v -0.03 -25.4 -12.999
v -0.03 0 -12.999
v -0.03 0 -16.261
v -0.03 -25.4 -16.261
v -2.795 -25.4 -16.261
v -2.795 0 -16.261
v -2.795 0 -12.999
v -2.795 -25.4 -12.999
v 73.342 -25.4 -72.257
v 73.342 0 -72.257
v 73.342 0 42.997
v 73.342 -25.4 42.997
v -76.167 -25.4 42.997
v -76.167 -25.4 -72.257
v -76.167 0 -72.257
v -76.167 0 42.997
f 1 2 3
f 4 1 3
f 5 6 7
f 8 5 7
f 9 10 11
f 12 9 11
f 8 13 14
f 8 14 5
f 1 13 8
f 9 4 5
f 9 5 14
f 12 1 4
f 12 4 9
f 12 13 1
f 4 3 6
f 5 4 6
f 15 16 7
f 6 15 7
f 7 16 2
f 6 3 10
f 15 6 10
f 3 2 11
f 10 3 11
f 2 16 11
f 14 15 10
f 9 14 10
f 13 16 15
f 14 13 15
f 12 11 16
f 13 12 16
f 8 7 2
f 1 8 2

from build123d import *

# Parameters (mm, degrees)
F1_DEPTH = 25.4
F2_DEPTH = 25.4
F3_DEPTH = 25.4
F4_DEPTH = 25.4
F5_DEPTH = 25.4
F6_DEPTH = 25.4
F7_DEPTH = 25.4
F8_DEPTH = 25.4


with BuildPart() as f1:
    # F0 (on Front) → F1 (new body)
    with BuildSketch(Plane.XZ):
        Polygon((-66.7927114991, 33.1945642829), (-64.1307688012, 33.1945642829), (-76.1674283869, 42.9970185669), (-76.1674283869, -72.256666741), (-64.1307688012, -62.4542124569), (-66.7927114991, -62.4542124569), align=None)
        Polygon((-64.1307688012, 33.1945642829), (61.9984398217, 33.1945642829), (73.3423603098, 42.9970185669), (-76.1674283869, 42.9970185669), align=None)
        Polygon((73.3423603098, 42.9970185669), (61.9984398217, 33.1945642829), (63.9676434221, 33.1945642829), (63.9676434221, -62.4542124569), (61.3057007242, -62.4542124569), (73.3423603098, -72.256666741), align=None)
        Polygon((73.3423603098, -72.256666741), (61.3057007242, -62.4542124569), (-64.1307688012, -62.4542124569), (-76.1674283869, -72.256666741), align=None)
    extrude(amount=F1_DEPTH)

    # F0 (on Front) → F2 (join)
    with BuildSketch(Plane.XZ):
        Polygon((-56.703176233, 23.9121932536), (-52.7327314332, 23.9121932536), (-64.1307688012, 33.1945642829), (-66.7927114991, 33.1945642829), (-66.7927114991, -62.4542124569), (-64.1307688012, -62.4542124569), (-52.7327314332, -53.1718414277), (-56.703176233, -53.1718414277), align=None)
        Polygon((-52.7327314332, 23.9121932536), (51.2563872861, 23.9121932536), (61.9984398217, 33.1945642829), (-64.1307688012, 33.1945642829), align=None)
        Polygon((61.9984398217, 33.1945642829), (51.2563872861, 23.9121932536), (53.8781081559, 23.9121932536), (53.8781081559, -53.1718414277), (49.9076633562, -53.1718414277), (61.3057007242, -62.4542124569), (63.9676434221, -62.4542124569), (63.9676434221, 33.1945642829), align=None)
        Polygon((61.3057007242, -62.4542124569), (49.9076633562, -53.1718414277), (-52.7327314332, -53.1718414277), (-64.1307688012, -62.4542124569), align=None)
    extrude(amount=F2_DEPTH)

    # F0 (on Front) → F3 (join)
    with BuildSketch(Plane.XZ):
        Polygon((-47.0172277419, 15.8405667171), (-42.8213951385, 15.8405667171), (-52.7327314332, 23.9121932536), (-56.703176233, 23.9121932536), (-56.703176233, -53.1718414277), (-52.7327314332, -53.1718414277), (-42.8213951385, -45.1002148911), (-47.0172277419, -45.1002148911), align=None)
        Polygon((-42.8213951385, 15.8405667171), (41.9154725532, 15.8405667171), (51.2563872861, 23.9121932536), (-52.7327314332, 23.9121932536), align=None)
        Polygon((51.2563872861, 23.9121932536), (41.9154725532, 15.8405667171), (44.1921596648, 15.8405667171), (44.1921596648, -45.1002148911), (39.9963270614, -45.1002148911), (49.9076633562, -53.1718414277), (53.8781081559, -53.1718414277), (53.8781081559, 23.9121932536), align=None)
        Polygon((49.9076633562, -53.1718414277), (39.9963270614, -45.1002148911), (-42.8213951385, -45.1002148911), (-52.7327314332, -53.1718414277), align=None)
    extrude(amount=F3_DEPTH)

    # F0 (on Front) → F4 (join)
    with BuildSketch(Plane.XZ):
        Polygon((-37.73485485, 9.7868470475), (-35.3878932033, 9.7868470475), (-42.8213951385, 15.8405667171), (-47.0172277419, 15.8405667171), (-47.0172277419, -45.1002148911), (-42.8213951385, -45.1002148911), (-35.3878932033, -39.0464952216), (-37.73485485, -39.0464952216), align=None)
        Polygon((-35.3878932033, 9.7868470475), (34.9097867729, 9.7868470475), (41.9154725532, 15.8405667171), (-42.8213951385, 15.8405667171), align=None)
        Polygon((41.9154725532, 15.8405667171), (34.9097867729, 9.7868470475), (34.9097867729, -39.0464952216), (32.5628251262, -39.0464952216), (39.9963270614, -45.1002148911), (44.1921596648, -45.1002148911), (44.1921596648, 15.8405667171), align=None)
        Polygon((39.9963270614, -45.1002148911), (32.5628251262, -39.0464952216), (-35.3878932033, -39.0464952216), (-42.8213951385, -45.1002148911), align=None)
    extrude(amount=F4_DEPTH)

    # F0 (on Front) → F5 (join)
    with BuildSketch(Plane.XZ):
        Polygon((-23.3703981031, -29.259648174), (-23.3703981031, 0), (-35.3878932033, 9.7868470475), (-37.73485485, 9.7868470475), (-37.73485485, -39.0464952216), (-35.3878932033, -39.0464952216), align=None)
        Polygon((-11.5020675585, 0), (13.5026567167, 0), (20.545330026, 0), (34.9097867729, 9.7868470475), (-35.3878932033, 9.7868470475), (-23.3703981031, 0), align=None)
        Polygon((34.9097867729, 9.7868470475), (20.545330026, 0), (20.545330026, -29.259648174), (32.5628251262, -39.0464952216), (34.9097867729, -39.0464952216), align=None)
        Polygon((32.5628251262, -39.0464952216), (20.545330026, -29.259648174), (-23.3703981031, -29.259648174), (-35.3878932033, -39.0464952216), align=None)
    extrude(amount=F5_DEPTH)

    # F0 (on Front) → F6 (join)
    with BuildSketch(Plane.XZ):
        Polygon((-16.3277247938, -2.6278241763), (-23.3703981031, 0), (-23.3703981031, -29.259648174), (-16.3277247938, -26.6318239978), align=None)
        Polygon((20.545330026, 0), (13.5026567167, 0), (-11.5020675585, 0), (-23.3703981031, 0), (-16.3277247938, -2.6278241763), (13.5026567167, -2.6278241763), align=None)
        Polygon((20.545330026, -29.259648174), (20.545330026, 0), (13.5026567167, -2.6278241763), (13.5026567167, -26.6318239978), align=None)
        Polygon((-23.3703981031, -29.259648174), (20.545330026, -29.259648174), (13.5026567167, -26.6318239978), (-16.3277247938, -26.6318239978), align=None)
    extrude(amount=F6_DEPTH)

    # F0 (on Front) → F7 (join)
    with BuildSketch(Plane.XZ):
        Polygon((-5.8775561365, -8.2857954661), (-16.3277247938, -2.6278241763), (-16.3277247938, -26.6318239978), (-7.8231978195, -20.973852708), (-7.8231978195, -8.2857954661), align=None)
        Polygon((4.9981297424, -8.2857954661), (13.5026567167, -2.6278241763), (-16.3277247938, -2.6278241763), (-5.8775561365, -8.2857954661), align=None)
        Polygon((13.5026567167, -26.6318239978), (13.5026567167, -2.6278241763), (4.9981297424, -8.2857954661), (4.9981297424, -20.973852708), align=None)
        Polygon((-16.3277247938, -26.6318239978), (13.5026567167, -26.6318239978), (4.9981297424, -20.973852708), (-7.8231978195, -20.973852708), align=None)
    extrude(amount=F7_DEPTH)

    # F0 (on Front) → F8 (join)
    with BuildSketch(Plane.XZ):
        Polygon((-7.8231978195, -20.973852708), (4.9981297424, -20.973852708), (-0.0295912258, -16.2605091053), (-2.7954768513, -16.2605091053), align=None)
        Polygon((-7.8231978195, -8.2857954661), (-7.8231978195, -20.973852708), (-2.7954768513, -16.2605091053), (-2.7954768513, -12.9991390688), align=None)
        Polygon((-0.0295912258, -12.9991390688), (4.9981297424, -8.2857954661), (-5.8775561365, -8.2857954661), (-7.8231978195, -8.2857954661), (-2.7954768513, -12.9991390688), align=None)
        Polygon((4.9981297424, -20.973852708), (4.9981297424, -8.2857954661), (-0.0295912258, -12.9991390688), (-0.0295912258, -16.2605091053), align=None)
    extrude(amount=F8_DEPTH)


solid = f1.part
